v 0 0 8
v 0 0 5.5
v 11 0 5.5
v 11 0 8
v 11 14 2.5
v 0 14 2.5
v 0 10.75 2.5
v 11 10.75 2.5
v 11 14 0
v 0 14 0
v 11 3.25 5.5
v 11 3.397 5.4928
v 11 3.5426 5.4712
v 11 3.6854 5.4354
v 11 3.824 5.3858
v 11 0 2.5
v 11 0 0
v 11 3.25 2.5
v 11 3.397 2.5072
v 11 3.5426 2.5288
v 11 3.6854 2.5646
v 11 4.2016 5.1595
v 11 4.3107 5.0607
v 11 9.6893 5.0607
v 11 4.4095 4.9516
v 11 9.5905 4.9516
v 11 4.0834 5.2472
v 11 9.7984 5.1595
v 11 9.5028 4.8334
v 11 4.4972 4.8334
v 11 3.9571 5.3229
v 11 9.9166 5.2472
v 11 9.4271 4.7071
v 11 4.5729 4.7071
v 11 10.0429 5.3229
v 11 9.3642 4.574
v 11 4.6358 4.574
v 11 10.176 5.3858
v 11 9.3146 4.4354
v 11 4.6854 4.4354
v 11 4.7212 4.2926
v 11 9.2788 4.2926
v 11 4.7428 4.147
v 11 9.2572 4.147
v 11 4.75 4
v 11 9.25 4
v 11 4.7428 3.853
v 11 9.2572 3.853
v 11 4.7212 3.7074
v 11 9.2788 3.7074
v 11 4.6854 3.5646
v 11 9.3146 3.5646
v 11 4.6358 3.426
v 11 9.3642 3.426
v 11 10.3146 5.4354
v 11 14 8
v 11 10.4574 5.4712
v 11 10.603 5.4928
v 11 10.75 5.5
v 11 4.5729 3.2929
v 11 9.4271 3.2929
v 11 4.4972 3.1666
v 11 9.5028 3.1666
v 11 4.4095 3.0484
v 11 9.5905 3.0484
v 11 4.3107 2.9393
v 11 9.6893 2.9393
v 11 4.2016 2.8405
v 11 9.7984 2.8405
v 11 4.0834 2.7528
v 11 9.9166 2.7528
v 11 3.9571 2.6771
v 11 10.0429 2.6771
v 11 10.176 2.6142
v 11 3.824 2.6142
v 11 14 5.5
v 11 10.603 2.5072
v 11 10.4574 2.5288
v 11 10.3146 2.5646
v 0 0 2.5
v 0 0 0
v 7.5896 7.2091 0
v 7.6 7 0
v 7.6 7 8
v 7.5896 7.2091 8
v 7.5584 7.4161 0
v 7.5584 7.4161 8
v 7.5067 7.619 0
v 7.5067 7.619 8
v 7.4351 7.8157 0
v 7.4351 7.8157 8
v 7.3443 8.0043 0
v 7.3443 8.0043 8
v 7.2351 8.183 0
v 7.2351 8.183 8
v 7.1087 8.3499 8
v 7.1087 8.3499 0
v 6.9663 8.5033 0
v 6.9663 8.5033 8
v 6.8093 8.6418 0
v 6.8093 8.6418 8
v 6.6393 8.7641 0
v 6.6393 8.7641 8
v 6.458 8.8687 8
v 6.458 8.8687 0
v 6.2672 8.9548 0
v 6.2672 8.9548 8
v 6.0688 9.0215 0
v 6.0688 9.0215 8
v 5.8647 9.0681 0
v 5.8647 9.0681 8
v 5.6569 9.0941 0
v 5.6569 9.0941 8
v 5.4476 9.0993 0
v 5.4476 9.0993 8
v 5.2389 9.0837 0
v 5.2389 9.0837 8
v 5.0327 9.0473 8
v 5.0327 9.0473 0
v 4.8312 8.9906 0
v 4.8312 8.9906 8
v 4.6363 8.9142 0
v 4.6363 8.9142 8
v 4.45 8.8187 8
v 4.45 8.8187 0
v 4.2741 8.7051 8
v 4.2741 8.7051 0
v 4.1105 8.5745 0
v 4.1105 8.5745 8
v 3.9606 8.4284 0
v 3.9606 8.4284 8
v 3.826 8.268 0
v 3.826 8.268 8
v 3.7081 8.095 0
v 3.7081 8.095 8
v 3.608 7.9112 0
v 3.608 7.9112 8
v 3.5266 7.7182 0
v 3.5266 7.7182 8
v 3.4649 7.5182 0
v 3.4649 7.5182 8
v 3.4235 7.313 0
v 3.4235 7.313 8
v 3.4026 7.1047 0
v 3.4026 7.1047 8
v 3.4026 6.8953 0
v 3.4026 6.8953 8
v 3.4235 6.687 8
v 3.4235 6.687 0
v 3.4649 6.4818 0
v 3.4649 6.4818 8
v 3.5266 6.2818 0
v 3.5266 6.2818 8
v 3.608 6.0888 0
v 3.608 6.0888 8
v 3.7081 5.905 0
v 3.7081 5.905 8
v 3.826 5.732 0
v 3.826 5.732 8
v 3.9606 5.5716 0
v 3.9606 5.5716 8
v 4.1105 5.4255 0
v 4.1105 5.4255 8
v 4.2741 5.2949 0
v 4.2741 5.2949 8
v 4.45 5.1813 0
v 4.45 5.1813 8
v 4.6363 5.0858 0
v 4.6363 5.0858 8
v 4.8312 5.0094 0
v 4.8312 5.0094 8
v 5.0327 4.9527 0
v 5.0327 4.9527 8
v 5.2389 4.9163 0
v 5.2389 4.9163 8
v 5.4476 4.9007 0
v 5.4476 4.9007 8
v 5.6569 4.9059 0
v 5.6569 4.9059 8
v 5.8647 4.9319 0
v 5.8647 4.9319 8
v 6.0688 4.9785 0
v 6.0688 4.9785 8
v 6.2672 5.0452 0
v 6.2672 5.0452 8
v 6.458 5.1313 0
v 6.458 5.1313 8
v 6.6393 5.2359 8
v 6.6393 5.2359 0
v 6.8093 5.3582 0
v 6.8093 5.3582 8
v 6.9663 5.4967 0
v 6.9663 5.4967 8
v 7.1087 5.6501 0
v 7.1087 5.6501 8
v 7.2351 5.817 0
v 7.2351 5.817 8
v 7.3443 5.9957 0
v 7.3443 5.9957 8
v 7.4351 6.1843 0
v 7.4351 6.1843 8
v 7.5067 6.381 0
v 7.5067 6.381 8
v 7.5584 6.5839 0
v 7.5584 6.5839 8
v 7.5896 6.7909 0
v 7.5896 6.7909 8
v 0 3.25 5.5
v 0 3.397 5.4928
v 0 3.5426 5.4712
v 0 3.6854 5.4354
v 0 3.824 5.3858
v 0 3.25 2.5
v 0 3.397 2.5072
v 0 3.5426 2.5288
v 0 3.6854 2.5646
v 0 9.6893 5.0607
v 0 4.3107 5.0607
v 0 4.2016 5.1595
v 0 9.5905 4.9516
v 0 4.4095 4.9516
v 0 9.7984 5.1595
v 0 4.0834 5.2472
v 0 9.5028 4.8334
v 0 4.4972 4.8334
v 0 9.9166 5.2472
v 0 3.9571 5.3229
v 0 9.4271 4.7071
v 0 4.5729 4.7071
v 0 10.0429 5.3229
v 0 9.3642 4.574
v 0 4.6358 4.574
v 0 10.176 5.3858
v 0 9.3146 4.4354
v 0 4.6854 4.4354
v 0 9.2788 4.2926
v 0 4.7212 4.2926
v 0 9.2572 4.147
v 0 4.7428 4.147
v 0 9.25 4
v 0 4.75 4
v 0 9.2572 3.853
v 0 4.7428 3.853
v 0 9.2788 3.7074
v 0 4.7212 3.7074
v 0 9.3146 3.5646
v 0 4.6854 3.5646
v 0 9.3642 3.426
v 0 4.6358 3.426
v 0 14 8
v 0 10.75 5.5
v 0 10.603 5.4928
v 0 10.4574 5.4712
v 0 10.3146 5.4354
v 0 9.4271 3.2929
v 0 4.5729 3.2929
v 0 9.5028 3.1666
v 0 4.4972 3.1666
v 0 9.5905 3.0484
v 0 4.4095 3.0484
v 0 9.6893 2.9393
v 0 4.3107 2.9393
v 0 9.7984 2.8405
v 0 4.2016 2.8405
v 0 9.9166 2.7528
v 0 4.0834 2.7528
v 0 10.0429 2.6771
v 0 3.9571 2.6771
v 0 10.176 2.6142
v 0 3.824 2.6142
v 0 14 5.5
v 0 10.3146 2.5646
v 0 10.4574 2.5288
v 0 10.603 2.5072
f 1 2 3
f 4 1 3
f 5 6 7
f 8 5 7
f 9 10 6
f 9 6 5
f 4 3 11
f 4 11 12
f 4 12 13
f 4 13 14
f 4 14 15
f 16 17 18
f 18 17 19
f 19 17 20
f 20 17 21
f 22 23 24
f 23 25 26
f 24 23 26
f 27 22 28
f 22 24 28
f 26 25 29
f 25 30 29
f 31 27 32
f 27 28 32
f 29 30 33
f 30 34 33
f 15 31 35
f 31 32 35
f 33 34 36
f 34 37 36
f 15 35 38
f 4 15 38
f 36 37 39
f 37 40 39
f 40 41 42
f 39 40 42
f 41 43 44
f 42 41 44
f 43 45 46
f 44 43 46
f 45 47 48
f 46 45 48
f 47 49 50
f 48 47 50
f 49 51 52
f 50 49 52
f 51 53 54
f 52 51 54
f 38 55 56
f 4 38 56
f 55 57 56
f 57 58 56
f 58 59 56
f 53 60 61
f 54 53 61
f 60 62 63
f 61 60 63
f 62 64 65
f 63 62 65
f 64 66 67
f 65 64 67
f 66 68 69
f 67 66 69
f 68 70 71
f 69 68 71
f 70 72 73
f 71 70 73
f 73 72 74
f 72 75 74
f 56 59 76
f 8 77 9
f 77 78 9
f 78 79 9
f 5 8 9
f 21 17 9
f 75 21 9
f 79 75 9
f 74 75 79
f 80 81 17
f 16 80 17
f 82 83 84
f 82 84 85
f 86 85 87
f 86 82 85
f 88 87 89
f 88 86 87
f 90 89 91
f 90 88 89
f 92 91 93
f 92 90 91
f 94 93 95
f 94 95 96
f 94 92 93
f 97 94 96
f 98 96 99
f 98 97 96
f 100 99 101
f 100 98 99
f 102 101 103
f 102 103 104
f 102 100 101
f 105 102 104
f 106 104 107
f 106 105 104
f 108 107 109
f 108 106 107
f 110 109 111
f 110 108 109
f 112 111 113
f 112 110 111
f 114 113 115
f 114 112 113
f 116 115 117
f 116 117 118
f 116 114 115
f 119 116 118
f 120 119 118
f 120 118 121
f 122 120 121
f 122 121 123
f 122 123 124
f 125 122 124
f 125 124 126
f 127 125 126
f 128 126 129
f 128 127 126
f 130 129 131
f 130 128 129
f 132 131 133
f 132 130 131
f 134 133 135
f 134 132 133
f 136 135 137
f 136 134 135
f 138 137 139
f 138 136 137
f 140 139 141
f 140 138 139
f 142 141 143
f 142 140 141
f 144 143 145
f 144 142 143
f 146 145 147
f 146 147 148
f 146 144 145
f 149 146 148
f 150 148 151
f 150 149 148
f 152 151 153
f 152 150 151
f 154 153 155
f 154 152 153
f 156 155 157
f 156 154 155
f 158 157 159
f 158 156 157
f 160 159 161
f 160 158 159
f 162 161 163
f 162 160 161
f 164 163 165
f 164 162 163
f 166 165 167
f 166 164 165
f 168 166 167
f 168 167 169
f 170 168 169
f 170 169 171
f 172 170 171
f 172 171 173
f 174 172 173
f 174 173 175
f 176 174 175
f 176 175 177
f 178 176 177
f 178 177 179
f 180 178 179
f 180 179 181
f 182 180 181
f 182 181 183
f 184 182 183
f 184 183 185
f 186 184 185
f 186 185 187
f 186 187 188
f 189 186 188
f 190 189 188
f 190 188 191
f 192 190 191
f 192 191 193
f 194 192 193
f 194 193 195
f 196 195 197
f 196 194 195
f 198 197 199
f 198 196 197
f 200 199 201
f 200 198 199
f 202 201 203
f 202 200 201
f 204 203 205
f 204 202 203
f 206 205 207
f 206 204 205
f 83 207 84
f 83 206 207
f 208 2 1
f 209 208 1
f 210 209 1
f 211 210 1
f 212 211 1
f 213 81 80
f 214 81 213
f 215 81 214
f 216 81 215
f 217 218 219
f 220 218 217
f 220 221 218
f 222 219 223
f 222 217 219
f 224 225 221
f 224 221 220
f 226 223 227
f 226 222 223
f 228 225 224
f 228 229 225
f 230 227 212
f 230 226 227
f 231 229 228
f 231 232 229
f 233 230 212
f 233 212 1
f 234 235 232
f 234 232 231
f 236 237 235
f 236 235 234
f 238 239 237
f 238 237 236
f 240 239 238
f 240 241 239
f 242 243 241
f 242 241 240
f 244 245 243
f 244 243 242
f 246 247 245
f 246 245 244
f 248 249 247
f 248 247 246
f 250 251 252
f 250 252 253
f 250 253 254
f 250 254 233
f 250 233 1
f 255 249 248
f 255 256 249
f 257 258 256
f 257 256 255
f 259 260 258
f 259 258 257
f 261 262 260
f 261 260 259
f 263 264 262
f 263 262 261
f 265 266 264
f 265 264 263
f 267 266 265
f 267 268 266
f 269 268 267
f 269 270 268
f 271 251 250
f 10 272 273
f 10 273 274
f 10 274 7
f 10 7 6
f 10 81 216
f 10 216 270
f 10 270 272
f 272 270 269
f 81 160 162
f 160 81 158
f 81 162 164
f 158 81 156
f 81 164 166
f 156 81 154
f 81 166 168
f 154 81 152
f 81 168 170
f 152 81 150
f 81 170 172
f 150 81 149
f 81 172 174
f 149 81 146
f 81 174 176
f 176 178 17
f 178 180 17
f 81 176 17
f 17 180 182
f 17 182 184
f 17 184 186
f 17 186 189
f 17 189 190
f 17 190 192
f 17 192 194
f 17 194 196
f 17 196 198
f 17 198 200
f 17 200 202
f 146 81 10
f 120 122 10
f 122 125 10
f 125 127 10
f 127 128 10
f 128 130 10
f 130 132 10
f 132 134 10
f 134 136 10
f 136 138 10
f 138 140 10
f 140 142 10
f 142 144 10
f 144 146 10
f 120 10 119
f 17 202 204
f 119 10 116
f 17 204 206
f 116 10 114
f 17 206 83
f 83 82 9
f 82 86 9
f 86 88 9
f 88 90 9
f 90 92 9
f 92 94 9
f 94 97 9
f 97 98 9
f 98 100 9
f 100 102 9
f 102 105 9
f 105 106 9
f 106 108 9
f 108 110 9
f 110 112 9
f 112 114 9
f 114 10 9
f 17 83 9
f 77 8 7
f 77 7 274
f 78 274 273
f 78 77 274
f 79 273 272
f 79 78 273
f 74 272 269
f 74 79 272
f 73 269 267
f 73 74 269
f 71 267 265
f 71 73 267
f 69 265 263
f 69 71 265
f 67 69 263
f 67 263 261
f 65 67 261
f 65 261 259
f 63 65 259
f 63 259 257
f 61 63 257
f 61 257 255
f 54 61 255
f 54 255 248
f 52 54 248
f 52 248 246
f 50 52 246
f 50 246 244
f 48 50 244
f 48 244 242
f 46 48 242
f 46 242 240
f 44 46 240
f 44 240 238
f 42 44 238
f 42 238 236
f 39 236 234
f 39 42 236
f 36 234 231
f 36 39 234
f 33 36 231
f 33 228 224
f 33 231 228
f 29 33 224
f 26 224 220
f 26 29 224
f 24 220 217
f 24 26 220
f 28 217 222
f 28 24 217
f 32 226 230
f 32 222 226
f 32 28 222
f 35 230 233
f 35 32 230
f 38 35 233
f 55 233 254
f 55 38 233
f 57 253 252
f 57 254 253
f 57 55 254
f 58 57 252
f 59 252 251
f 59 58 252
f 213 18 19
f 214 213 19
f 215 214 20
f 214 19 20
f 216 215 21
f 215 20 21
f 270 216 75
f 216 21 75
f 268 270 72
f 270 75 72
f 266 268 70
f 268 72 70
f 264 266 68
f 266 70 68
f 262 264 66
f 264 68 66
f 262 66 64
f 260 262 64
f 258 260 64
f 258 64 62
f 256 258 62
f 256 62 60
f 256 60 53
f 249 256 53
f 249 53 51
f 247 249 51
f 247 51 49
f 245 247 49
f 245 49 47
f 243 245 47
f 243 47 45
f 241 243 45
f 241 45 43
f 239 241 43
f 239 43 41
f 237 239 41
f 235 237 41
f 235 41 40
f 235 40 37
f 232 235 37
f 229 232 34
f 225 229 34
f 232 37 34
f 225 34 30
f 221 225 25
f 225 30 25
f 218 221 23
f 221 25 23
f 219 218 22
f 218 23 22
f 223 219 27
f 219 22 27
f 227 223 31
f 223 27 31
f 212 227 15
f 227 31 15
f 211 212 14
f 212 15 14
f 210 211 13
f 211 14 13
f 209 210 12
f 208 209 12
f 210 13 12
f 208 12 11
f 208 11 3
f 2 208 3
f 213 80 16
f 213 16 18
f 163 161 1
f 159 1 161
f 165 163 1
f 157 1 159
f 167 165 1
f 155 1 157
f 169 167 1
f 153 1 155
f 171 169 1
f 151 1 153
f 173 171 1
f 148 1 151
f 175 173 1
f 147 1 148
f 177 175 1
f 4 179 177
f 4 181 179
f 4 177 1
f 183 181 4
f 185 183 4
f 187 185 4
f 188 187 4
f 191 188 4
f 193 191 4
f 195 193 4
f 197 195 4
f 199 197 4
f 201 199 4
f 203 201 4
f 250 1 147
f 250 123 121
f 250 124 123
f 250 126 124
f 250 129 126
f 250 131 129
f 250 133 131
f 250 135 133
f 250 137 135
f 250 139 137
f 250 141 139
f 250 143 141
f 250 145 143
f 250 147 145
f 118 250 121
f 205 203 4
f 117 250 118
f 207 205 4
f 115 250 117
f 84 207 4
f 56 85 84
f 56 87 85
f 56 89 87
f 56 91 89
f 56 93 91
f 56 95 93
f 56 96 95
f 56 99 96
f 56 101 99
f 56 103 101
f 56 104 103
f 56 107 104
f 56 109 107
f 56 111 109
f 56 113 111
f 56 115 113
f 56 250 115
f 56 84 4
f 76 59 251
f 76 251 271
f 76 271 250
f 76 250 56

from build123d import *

# Parameters (mm, degrees)
SKETCH_1_W          = 11
SKETCH_1_H          = 14
SKETCH_1_R          = 2.1
EXTRUDE_1_DEPTH     = 8
CUT_EXTRUDE_1_DEPTH = 18


with BuildPart() as part:
    # Эскиз1 → Вытянуть1 (new body)
    with BuildSketch(Plane.XY):
        with Locations((5.5, 7)):
            Rectangle(SKETCH_1_W, SKETCH_1_H)
        with Locations((5.5, 7)):
            Circle(SKETCH_1_R, mode=Mode.SUBTRACT)
    extrude(amount=EXTRUDE_1_DEPTH)

    # Эскиз2 → Вырез-Вытянуть1 (cut)
    with BuildSketch(Plane(origin=(11, 0, 0), x_dir=(0, 0, -1), z_dir=(1, 0, 0))):
        with BuildLine():
            Line((-5.5, 15.242713302), (-2.5, 15.242713302))
            Line((-2.5, 15.242713302), (-2.5, 10.75))
            ThreePointArc((-2.5, 10.75), (-4.00000012, 9.25), (-5.5, 10.750000239))
            Line((-5.5, 10.750000239), (-5.5, 15.242713302))
        make_face()
        with BuildLine():
            Line((-5.5, -1.965553789), (-2.5, -1.965553789))
            Line((-2.5, -1.965553789), (-2.5, 3.25))
            ThreePointArc((-2.5, 3.25), (-3.999999879, 4.75), (-5.5, 3.250000241))
            Line((-5.5, 3.250000241), (-5.5, -1.965553789))
        make_face()
    extrude(amount=-CUT_EXTRUDE_1_DEPTH, mode=Mode.SUBTRACT)


solid = part.part
